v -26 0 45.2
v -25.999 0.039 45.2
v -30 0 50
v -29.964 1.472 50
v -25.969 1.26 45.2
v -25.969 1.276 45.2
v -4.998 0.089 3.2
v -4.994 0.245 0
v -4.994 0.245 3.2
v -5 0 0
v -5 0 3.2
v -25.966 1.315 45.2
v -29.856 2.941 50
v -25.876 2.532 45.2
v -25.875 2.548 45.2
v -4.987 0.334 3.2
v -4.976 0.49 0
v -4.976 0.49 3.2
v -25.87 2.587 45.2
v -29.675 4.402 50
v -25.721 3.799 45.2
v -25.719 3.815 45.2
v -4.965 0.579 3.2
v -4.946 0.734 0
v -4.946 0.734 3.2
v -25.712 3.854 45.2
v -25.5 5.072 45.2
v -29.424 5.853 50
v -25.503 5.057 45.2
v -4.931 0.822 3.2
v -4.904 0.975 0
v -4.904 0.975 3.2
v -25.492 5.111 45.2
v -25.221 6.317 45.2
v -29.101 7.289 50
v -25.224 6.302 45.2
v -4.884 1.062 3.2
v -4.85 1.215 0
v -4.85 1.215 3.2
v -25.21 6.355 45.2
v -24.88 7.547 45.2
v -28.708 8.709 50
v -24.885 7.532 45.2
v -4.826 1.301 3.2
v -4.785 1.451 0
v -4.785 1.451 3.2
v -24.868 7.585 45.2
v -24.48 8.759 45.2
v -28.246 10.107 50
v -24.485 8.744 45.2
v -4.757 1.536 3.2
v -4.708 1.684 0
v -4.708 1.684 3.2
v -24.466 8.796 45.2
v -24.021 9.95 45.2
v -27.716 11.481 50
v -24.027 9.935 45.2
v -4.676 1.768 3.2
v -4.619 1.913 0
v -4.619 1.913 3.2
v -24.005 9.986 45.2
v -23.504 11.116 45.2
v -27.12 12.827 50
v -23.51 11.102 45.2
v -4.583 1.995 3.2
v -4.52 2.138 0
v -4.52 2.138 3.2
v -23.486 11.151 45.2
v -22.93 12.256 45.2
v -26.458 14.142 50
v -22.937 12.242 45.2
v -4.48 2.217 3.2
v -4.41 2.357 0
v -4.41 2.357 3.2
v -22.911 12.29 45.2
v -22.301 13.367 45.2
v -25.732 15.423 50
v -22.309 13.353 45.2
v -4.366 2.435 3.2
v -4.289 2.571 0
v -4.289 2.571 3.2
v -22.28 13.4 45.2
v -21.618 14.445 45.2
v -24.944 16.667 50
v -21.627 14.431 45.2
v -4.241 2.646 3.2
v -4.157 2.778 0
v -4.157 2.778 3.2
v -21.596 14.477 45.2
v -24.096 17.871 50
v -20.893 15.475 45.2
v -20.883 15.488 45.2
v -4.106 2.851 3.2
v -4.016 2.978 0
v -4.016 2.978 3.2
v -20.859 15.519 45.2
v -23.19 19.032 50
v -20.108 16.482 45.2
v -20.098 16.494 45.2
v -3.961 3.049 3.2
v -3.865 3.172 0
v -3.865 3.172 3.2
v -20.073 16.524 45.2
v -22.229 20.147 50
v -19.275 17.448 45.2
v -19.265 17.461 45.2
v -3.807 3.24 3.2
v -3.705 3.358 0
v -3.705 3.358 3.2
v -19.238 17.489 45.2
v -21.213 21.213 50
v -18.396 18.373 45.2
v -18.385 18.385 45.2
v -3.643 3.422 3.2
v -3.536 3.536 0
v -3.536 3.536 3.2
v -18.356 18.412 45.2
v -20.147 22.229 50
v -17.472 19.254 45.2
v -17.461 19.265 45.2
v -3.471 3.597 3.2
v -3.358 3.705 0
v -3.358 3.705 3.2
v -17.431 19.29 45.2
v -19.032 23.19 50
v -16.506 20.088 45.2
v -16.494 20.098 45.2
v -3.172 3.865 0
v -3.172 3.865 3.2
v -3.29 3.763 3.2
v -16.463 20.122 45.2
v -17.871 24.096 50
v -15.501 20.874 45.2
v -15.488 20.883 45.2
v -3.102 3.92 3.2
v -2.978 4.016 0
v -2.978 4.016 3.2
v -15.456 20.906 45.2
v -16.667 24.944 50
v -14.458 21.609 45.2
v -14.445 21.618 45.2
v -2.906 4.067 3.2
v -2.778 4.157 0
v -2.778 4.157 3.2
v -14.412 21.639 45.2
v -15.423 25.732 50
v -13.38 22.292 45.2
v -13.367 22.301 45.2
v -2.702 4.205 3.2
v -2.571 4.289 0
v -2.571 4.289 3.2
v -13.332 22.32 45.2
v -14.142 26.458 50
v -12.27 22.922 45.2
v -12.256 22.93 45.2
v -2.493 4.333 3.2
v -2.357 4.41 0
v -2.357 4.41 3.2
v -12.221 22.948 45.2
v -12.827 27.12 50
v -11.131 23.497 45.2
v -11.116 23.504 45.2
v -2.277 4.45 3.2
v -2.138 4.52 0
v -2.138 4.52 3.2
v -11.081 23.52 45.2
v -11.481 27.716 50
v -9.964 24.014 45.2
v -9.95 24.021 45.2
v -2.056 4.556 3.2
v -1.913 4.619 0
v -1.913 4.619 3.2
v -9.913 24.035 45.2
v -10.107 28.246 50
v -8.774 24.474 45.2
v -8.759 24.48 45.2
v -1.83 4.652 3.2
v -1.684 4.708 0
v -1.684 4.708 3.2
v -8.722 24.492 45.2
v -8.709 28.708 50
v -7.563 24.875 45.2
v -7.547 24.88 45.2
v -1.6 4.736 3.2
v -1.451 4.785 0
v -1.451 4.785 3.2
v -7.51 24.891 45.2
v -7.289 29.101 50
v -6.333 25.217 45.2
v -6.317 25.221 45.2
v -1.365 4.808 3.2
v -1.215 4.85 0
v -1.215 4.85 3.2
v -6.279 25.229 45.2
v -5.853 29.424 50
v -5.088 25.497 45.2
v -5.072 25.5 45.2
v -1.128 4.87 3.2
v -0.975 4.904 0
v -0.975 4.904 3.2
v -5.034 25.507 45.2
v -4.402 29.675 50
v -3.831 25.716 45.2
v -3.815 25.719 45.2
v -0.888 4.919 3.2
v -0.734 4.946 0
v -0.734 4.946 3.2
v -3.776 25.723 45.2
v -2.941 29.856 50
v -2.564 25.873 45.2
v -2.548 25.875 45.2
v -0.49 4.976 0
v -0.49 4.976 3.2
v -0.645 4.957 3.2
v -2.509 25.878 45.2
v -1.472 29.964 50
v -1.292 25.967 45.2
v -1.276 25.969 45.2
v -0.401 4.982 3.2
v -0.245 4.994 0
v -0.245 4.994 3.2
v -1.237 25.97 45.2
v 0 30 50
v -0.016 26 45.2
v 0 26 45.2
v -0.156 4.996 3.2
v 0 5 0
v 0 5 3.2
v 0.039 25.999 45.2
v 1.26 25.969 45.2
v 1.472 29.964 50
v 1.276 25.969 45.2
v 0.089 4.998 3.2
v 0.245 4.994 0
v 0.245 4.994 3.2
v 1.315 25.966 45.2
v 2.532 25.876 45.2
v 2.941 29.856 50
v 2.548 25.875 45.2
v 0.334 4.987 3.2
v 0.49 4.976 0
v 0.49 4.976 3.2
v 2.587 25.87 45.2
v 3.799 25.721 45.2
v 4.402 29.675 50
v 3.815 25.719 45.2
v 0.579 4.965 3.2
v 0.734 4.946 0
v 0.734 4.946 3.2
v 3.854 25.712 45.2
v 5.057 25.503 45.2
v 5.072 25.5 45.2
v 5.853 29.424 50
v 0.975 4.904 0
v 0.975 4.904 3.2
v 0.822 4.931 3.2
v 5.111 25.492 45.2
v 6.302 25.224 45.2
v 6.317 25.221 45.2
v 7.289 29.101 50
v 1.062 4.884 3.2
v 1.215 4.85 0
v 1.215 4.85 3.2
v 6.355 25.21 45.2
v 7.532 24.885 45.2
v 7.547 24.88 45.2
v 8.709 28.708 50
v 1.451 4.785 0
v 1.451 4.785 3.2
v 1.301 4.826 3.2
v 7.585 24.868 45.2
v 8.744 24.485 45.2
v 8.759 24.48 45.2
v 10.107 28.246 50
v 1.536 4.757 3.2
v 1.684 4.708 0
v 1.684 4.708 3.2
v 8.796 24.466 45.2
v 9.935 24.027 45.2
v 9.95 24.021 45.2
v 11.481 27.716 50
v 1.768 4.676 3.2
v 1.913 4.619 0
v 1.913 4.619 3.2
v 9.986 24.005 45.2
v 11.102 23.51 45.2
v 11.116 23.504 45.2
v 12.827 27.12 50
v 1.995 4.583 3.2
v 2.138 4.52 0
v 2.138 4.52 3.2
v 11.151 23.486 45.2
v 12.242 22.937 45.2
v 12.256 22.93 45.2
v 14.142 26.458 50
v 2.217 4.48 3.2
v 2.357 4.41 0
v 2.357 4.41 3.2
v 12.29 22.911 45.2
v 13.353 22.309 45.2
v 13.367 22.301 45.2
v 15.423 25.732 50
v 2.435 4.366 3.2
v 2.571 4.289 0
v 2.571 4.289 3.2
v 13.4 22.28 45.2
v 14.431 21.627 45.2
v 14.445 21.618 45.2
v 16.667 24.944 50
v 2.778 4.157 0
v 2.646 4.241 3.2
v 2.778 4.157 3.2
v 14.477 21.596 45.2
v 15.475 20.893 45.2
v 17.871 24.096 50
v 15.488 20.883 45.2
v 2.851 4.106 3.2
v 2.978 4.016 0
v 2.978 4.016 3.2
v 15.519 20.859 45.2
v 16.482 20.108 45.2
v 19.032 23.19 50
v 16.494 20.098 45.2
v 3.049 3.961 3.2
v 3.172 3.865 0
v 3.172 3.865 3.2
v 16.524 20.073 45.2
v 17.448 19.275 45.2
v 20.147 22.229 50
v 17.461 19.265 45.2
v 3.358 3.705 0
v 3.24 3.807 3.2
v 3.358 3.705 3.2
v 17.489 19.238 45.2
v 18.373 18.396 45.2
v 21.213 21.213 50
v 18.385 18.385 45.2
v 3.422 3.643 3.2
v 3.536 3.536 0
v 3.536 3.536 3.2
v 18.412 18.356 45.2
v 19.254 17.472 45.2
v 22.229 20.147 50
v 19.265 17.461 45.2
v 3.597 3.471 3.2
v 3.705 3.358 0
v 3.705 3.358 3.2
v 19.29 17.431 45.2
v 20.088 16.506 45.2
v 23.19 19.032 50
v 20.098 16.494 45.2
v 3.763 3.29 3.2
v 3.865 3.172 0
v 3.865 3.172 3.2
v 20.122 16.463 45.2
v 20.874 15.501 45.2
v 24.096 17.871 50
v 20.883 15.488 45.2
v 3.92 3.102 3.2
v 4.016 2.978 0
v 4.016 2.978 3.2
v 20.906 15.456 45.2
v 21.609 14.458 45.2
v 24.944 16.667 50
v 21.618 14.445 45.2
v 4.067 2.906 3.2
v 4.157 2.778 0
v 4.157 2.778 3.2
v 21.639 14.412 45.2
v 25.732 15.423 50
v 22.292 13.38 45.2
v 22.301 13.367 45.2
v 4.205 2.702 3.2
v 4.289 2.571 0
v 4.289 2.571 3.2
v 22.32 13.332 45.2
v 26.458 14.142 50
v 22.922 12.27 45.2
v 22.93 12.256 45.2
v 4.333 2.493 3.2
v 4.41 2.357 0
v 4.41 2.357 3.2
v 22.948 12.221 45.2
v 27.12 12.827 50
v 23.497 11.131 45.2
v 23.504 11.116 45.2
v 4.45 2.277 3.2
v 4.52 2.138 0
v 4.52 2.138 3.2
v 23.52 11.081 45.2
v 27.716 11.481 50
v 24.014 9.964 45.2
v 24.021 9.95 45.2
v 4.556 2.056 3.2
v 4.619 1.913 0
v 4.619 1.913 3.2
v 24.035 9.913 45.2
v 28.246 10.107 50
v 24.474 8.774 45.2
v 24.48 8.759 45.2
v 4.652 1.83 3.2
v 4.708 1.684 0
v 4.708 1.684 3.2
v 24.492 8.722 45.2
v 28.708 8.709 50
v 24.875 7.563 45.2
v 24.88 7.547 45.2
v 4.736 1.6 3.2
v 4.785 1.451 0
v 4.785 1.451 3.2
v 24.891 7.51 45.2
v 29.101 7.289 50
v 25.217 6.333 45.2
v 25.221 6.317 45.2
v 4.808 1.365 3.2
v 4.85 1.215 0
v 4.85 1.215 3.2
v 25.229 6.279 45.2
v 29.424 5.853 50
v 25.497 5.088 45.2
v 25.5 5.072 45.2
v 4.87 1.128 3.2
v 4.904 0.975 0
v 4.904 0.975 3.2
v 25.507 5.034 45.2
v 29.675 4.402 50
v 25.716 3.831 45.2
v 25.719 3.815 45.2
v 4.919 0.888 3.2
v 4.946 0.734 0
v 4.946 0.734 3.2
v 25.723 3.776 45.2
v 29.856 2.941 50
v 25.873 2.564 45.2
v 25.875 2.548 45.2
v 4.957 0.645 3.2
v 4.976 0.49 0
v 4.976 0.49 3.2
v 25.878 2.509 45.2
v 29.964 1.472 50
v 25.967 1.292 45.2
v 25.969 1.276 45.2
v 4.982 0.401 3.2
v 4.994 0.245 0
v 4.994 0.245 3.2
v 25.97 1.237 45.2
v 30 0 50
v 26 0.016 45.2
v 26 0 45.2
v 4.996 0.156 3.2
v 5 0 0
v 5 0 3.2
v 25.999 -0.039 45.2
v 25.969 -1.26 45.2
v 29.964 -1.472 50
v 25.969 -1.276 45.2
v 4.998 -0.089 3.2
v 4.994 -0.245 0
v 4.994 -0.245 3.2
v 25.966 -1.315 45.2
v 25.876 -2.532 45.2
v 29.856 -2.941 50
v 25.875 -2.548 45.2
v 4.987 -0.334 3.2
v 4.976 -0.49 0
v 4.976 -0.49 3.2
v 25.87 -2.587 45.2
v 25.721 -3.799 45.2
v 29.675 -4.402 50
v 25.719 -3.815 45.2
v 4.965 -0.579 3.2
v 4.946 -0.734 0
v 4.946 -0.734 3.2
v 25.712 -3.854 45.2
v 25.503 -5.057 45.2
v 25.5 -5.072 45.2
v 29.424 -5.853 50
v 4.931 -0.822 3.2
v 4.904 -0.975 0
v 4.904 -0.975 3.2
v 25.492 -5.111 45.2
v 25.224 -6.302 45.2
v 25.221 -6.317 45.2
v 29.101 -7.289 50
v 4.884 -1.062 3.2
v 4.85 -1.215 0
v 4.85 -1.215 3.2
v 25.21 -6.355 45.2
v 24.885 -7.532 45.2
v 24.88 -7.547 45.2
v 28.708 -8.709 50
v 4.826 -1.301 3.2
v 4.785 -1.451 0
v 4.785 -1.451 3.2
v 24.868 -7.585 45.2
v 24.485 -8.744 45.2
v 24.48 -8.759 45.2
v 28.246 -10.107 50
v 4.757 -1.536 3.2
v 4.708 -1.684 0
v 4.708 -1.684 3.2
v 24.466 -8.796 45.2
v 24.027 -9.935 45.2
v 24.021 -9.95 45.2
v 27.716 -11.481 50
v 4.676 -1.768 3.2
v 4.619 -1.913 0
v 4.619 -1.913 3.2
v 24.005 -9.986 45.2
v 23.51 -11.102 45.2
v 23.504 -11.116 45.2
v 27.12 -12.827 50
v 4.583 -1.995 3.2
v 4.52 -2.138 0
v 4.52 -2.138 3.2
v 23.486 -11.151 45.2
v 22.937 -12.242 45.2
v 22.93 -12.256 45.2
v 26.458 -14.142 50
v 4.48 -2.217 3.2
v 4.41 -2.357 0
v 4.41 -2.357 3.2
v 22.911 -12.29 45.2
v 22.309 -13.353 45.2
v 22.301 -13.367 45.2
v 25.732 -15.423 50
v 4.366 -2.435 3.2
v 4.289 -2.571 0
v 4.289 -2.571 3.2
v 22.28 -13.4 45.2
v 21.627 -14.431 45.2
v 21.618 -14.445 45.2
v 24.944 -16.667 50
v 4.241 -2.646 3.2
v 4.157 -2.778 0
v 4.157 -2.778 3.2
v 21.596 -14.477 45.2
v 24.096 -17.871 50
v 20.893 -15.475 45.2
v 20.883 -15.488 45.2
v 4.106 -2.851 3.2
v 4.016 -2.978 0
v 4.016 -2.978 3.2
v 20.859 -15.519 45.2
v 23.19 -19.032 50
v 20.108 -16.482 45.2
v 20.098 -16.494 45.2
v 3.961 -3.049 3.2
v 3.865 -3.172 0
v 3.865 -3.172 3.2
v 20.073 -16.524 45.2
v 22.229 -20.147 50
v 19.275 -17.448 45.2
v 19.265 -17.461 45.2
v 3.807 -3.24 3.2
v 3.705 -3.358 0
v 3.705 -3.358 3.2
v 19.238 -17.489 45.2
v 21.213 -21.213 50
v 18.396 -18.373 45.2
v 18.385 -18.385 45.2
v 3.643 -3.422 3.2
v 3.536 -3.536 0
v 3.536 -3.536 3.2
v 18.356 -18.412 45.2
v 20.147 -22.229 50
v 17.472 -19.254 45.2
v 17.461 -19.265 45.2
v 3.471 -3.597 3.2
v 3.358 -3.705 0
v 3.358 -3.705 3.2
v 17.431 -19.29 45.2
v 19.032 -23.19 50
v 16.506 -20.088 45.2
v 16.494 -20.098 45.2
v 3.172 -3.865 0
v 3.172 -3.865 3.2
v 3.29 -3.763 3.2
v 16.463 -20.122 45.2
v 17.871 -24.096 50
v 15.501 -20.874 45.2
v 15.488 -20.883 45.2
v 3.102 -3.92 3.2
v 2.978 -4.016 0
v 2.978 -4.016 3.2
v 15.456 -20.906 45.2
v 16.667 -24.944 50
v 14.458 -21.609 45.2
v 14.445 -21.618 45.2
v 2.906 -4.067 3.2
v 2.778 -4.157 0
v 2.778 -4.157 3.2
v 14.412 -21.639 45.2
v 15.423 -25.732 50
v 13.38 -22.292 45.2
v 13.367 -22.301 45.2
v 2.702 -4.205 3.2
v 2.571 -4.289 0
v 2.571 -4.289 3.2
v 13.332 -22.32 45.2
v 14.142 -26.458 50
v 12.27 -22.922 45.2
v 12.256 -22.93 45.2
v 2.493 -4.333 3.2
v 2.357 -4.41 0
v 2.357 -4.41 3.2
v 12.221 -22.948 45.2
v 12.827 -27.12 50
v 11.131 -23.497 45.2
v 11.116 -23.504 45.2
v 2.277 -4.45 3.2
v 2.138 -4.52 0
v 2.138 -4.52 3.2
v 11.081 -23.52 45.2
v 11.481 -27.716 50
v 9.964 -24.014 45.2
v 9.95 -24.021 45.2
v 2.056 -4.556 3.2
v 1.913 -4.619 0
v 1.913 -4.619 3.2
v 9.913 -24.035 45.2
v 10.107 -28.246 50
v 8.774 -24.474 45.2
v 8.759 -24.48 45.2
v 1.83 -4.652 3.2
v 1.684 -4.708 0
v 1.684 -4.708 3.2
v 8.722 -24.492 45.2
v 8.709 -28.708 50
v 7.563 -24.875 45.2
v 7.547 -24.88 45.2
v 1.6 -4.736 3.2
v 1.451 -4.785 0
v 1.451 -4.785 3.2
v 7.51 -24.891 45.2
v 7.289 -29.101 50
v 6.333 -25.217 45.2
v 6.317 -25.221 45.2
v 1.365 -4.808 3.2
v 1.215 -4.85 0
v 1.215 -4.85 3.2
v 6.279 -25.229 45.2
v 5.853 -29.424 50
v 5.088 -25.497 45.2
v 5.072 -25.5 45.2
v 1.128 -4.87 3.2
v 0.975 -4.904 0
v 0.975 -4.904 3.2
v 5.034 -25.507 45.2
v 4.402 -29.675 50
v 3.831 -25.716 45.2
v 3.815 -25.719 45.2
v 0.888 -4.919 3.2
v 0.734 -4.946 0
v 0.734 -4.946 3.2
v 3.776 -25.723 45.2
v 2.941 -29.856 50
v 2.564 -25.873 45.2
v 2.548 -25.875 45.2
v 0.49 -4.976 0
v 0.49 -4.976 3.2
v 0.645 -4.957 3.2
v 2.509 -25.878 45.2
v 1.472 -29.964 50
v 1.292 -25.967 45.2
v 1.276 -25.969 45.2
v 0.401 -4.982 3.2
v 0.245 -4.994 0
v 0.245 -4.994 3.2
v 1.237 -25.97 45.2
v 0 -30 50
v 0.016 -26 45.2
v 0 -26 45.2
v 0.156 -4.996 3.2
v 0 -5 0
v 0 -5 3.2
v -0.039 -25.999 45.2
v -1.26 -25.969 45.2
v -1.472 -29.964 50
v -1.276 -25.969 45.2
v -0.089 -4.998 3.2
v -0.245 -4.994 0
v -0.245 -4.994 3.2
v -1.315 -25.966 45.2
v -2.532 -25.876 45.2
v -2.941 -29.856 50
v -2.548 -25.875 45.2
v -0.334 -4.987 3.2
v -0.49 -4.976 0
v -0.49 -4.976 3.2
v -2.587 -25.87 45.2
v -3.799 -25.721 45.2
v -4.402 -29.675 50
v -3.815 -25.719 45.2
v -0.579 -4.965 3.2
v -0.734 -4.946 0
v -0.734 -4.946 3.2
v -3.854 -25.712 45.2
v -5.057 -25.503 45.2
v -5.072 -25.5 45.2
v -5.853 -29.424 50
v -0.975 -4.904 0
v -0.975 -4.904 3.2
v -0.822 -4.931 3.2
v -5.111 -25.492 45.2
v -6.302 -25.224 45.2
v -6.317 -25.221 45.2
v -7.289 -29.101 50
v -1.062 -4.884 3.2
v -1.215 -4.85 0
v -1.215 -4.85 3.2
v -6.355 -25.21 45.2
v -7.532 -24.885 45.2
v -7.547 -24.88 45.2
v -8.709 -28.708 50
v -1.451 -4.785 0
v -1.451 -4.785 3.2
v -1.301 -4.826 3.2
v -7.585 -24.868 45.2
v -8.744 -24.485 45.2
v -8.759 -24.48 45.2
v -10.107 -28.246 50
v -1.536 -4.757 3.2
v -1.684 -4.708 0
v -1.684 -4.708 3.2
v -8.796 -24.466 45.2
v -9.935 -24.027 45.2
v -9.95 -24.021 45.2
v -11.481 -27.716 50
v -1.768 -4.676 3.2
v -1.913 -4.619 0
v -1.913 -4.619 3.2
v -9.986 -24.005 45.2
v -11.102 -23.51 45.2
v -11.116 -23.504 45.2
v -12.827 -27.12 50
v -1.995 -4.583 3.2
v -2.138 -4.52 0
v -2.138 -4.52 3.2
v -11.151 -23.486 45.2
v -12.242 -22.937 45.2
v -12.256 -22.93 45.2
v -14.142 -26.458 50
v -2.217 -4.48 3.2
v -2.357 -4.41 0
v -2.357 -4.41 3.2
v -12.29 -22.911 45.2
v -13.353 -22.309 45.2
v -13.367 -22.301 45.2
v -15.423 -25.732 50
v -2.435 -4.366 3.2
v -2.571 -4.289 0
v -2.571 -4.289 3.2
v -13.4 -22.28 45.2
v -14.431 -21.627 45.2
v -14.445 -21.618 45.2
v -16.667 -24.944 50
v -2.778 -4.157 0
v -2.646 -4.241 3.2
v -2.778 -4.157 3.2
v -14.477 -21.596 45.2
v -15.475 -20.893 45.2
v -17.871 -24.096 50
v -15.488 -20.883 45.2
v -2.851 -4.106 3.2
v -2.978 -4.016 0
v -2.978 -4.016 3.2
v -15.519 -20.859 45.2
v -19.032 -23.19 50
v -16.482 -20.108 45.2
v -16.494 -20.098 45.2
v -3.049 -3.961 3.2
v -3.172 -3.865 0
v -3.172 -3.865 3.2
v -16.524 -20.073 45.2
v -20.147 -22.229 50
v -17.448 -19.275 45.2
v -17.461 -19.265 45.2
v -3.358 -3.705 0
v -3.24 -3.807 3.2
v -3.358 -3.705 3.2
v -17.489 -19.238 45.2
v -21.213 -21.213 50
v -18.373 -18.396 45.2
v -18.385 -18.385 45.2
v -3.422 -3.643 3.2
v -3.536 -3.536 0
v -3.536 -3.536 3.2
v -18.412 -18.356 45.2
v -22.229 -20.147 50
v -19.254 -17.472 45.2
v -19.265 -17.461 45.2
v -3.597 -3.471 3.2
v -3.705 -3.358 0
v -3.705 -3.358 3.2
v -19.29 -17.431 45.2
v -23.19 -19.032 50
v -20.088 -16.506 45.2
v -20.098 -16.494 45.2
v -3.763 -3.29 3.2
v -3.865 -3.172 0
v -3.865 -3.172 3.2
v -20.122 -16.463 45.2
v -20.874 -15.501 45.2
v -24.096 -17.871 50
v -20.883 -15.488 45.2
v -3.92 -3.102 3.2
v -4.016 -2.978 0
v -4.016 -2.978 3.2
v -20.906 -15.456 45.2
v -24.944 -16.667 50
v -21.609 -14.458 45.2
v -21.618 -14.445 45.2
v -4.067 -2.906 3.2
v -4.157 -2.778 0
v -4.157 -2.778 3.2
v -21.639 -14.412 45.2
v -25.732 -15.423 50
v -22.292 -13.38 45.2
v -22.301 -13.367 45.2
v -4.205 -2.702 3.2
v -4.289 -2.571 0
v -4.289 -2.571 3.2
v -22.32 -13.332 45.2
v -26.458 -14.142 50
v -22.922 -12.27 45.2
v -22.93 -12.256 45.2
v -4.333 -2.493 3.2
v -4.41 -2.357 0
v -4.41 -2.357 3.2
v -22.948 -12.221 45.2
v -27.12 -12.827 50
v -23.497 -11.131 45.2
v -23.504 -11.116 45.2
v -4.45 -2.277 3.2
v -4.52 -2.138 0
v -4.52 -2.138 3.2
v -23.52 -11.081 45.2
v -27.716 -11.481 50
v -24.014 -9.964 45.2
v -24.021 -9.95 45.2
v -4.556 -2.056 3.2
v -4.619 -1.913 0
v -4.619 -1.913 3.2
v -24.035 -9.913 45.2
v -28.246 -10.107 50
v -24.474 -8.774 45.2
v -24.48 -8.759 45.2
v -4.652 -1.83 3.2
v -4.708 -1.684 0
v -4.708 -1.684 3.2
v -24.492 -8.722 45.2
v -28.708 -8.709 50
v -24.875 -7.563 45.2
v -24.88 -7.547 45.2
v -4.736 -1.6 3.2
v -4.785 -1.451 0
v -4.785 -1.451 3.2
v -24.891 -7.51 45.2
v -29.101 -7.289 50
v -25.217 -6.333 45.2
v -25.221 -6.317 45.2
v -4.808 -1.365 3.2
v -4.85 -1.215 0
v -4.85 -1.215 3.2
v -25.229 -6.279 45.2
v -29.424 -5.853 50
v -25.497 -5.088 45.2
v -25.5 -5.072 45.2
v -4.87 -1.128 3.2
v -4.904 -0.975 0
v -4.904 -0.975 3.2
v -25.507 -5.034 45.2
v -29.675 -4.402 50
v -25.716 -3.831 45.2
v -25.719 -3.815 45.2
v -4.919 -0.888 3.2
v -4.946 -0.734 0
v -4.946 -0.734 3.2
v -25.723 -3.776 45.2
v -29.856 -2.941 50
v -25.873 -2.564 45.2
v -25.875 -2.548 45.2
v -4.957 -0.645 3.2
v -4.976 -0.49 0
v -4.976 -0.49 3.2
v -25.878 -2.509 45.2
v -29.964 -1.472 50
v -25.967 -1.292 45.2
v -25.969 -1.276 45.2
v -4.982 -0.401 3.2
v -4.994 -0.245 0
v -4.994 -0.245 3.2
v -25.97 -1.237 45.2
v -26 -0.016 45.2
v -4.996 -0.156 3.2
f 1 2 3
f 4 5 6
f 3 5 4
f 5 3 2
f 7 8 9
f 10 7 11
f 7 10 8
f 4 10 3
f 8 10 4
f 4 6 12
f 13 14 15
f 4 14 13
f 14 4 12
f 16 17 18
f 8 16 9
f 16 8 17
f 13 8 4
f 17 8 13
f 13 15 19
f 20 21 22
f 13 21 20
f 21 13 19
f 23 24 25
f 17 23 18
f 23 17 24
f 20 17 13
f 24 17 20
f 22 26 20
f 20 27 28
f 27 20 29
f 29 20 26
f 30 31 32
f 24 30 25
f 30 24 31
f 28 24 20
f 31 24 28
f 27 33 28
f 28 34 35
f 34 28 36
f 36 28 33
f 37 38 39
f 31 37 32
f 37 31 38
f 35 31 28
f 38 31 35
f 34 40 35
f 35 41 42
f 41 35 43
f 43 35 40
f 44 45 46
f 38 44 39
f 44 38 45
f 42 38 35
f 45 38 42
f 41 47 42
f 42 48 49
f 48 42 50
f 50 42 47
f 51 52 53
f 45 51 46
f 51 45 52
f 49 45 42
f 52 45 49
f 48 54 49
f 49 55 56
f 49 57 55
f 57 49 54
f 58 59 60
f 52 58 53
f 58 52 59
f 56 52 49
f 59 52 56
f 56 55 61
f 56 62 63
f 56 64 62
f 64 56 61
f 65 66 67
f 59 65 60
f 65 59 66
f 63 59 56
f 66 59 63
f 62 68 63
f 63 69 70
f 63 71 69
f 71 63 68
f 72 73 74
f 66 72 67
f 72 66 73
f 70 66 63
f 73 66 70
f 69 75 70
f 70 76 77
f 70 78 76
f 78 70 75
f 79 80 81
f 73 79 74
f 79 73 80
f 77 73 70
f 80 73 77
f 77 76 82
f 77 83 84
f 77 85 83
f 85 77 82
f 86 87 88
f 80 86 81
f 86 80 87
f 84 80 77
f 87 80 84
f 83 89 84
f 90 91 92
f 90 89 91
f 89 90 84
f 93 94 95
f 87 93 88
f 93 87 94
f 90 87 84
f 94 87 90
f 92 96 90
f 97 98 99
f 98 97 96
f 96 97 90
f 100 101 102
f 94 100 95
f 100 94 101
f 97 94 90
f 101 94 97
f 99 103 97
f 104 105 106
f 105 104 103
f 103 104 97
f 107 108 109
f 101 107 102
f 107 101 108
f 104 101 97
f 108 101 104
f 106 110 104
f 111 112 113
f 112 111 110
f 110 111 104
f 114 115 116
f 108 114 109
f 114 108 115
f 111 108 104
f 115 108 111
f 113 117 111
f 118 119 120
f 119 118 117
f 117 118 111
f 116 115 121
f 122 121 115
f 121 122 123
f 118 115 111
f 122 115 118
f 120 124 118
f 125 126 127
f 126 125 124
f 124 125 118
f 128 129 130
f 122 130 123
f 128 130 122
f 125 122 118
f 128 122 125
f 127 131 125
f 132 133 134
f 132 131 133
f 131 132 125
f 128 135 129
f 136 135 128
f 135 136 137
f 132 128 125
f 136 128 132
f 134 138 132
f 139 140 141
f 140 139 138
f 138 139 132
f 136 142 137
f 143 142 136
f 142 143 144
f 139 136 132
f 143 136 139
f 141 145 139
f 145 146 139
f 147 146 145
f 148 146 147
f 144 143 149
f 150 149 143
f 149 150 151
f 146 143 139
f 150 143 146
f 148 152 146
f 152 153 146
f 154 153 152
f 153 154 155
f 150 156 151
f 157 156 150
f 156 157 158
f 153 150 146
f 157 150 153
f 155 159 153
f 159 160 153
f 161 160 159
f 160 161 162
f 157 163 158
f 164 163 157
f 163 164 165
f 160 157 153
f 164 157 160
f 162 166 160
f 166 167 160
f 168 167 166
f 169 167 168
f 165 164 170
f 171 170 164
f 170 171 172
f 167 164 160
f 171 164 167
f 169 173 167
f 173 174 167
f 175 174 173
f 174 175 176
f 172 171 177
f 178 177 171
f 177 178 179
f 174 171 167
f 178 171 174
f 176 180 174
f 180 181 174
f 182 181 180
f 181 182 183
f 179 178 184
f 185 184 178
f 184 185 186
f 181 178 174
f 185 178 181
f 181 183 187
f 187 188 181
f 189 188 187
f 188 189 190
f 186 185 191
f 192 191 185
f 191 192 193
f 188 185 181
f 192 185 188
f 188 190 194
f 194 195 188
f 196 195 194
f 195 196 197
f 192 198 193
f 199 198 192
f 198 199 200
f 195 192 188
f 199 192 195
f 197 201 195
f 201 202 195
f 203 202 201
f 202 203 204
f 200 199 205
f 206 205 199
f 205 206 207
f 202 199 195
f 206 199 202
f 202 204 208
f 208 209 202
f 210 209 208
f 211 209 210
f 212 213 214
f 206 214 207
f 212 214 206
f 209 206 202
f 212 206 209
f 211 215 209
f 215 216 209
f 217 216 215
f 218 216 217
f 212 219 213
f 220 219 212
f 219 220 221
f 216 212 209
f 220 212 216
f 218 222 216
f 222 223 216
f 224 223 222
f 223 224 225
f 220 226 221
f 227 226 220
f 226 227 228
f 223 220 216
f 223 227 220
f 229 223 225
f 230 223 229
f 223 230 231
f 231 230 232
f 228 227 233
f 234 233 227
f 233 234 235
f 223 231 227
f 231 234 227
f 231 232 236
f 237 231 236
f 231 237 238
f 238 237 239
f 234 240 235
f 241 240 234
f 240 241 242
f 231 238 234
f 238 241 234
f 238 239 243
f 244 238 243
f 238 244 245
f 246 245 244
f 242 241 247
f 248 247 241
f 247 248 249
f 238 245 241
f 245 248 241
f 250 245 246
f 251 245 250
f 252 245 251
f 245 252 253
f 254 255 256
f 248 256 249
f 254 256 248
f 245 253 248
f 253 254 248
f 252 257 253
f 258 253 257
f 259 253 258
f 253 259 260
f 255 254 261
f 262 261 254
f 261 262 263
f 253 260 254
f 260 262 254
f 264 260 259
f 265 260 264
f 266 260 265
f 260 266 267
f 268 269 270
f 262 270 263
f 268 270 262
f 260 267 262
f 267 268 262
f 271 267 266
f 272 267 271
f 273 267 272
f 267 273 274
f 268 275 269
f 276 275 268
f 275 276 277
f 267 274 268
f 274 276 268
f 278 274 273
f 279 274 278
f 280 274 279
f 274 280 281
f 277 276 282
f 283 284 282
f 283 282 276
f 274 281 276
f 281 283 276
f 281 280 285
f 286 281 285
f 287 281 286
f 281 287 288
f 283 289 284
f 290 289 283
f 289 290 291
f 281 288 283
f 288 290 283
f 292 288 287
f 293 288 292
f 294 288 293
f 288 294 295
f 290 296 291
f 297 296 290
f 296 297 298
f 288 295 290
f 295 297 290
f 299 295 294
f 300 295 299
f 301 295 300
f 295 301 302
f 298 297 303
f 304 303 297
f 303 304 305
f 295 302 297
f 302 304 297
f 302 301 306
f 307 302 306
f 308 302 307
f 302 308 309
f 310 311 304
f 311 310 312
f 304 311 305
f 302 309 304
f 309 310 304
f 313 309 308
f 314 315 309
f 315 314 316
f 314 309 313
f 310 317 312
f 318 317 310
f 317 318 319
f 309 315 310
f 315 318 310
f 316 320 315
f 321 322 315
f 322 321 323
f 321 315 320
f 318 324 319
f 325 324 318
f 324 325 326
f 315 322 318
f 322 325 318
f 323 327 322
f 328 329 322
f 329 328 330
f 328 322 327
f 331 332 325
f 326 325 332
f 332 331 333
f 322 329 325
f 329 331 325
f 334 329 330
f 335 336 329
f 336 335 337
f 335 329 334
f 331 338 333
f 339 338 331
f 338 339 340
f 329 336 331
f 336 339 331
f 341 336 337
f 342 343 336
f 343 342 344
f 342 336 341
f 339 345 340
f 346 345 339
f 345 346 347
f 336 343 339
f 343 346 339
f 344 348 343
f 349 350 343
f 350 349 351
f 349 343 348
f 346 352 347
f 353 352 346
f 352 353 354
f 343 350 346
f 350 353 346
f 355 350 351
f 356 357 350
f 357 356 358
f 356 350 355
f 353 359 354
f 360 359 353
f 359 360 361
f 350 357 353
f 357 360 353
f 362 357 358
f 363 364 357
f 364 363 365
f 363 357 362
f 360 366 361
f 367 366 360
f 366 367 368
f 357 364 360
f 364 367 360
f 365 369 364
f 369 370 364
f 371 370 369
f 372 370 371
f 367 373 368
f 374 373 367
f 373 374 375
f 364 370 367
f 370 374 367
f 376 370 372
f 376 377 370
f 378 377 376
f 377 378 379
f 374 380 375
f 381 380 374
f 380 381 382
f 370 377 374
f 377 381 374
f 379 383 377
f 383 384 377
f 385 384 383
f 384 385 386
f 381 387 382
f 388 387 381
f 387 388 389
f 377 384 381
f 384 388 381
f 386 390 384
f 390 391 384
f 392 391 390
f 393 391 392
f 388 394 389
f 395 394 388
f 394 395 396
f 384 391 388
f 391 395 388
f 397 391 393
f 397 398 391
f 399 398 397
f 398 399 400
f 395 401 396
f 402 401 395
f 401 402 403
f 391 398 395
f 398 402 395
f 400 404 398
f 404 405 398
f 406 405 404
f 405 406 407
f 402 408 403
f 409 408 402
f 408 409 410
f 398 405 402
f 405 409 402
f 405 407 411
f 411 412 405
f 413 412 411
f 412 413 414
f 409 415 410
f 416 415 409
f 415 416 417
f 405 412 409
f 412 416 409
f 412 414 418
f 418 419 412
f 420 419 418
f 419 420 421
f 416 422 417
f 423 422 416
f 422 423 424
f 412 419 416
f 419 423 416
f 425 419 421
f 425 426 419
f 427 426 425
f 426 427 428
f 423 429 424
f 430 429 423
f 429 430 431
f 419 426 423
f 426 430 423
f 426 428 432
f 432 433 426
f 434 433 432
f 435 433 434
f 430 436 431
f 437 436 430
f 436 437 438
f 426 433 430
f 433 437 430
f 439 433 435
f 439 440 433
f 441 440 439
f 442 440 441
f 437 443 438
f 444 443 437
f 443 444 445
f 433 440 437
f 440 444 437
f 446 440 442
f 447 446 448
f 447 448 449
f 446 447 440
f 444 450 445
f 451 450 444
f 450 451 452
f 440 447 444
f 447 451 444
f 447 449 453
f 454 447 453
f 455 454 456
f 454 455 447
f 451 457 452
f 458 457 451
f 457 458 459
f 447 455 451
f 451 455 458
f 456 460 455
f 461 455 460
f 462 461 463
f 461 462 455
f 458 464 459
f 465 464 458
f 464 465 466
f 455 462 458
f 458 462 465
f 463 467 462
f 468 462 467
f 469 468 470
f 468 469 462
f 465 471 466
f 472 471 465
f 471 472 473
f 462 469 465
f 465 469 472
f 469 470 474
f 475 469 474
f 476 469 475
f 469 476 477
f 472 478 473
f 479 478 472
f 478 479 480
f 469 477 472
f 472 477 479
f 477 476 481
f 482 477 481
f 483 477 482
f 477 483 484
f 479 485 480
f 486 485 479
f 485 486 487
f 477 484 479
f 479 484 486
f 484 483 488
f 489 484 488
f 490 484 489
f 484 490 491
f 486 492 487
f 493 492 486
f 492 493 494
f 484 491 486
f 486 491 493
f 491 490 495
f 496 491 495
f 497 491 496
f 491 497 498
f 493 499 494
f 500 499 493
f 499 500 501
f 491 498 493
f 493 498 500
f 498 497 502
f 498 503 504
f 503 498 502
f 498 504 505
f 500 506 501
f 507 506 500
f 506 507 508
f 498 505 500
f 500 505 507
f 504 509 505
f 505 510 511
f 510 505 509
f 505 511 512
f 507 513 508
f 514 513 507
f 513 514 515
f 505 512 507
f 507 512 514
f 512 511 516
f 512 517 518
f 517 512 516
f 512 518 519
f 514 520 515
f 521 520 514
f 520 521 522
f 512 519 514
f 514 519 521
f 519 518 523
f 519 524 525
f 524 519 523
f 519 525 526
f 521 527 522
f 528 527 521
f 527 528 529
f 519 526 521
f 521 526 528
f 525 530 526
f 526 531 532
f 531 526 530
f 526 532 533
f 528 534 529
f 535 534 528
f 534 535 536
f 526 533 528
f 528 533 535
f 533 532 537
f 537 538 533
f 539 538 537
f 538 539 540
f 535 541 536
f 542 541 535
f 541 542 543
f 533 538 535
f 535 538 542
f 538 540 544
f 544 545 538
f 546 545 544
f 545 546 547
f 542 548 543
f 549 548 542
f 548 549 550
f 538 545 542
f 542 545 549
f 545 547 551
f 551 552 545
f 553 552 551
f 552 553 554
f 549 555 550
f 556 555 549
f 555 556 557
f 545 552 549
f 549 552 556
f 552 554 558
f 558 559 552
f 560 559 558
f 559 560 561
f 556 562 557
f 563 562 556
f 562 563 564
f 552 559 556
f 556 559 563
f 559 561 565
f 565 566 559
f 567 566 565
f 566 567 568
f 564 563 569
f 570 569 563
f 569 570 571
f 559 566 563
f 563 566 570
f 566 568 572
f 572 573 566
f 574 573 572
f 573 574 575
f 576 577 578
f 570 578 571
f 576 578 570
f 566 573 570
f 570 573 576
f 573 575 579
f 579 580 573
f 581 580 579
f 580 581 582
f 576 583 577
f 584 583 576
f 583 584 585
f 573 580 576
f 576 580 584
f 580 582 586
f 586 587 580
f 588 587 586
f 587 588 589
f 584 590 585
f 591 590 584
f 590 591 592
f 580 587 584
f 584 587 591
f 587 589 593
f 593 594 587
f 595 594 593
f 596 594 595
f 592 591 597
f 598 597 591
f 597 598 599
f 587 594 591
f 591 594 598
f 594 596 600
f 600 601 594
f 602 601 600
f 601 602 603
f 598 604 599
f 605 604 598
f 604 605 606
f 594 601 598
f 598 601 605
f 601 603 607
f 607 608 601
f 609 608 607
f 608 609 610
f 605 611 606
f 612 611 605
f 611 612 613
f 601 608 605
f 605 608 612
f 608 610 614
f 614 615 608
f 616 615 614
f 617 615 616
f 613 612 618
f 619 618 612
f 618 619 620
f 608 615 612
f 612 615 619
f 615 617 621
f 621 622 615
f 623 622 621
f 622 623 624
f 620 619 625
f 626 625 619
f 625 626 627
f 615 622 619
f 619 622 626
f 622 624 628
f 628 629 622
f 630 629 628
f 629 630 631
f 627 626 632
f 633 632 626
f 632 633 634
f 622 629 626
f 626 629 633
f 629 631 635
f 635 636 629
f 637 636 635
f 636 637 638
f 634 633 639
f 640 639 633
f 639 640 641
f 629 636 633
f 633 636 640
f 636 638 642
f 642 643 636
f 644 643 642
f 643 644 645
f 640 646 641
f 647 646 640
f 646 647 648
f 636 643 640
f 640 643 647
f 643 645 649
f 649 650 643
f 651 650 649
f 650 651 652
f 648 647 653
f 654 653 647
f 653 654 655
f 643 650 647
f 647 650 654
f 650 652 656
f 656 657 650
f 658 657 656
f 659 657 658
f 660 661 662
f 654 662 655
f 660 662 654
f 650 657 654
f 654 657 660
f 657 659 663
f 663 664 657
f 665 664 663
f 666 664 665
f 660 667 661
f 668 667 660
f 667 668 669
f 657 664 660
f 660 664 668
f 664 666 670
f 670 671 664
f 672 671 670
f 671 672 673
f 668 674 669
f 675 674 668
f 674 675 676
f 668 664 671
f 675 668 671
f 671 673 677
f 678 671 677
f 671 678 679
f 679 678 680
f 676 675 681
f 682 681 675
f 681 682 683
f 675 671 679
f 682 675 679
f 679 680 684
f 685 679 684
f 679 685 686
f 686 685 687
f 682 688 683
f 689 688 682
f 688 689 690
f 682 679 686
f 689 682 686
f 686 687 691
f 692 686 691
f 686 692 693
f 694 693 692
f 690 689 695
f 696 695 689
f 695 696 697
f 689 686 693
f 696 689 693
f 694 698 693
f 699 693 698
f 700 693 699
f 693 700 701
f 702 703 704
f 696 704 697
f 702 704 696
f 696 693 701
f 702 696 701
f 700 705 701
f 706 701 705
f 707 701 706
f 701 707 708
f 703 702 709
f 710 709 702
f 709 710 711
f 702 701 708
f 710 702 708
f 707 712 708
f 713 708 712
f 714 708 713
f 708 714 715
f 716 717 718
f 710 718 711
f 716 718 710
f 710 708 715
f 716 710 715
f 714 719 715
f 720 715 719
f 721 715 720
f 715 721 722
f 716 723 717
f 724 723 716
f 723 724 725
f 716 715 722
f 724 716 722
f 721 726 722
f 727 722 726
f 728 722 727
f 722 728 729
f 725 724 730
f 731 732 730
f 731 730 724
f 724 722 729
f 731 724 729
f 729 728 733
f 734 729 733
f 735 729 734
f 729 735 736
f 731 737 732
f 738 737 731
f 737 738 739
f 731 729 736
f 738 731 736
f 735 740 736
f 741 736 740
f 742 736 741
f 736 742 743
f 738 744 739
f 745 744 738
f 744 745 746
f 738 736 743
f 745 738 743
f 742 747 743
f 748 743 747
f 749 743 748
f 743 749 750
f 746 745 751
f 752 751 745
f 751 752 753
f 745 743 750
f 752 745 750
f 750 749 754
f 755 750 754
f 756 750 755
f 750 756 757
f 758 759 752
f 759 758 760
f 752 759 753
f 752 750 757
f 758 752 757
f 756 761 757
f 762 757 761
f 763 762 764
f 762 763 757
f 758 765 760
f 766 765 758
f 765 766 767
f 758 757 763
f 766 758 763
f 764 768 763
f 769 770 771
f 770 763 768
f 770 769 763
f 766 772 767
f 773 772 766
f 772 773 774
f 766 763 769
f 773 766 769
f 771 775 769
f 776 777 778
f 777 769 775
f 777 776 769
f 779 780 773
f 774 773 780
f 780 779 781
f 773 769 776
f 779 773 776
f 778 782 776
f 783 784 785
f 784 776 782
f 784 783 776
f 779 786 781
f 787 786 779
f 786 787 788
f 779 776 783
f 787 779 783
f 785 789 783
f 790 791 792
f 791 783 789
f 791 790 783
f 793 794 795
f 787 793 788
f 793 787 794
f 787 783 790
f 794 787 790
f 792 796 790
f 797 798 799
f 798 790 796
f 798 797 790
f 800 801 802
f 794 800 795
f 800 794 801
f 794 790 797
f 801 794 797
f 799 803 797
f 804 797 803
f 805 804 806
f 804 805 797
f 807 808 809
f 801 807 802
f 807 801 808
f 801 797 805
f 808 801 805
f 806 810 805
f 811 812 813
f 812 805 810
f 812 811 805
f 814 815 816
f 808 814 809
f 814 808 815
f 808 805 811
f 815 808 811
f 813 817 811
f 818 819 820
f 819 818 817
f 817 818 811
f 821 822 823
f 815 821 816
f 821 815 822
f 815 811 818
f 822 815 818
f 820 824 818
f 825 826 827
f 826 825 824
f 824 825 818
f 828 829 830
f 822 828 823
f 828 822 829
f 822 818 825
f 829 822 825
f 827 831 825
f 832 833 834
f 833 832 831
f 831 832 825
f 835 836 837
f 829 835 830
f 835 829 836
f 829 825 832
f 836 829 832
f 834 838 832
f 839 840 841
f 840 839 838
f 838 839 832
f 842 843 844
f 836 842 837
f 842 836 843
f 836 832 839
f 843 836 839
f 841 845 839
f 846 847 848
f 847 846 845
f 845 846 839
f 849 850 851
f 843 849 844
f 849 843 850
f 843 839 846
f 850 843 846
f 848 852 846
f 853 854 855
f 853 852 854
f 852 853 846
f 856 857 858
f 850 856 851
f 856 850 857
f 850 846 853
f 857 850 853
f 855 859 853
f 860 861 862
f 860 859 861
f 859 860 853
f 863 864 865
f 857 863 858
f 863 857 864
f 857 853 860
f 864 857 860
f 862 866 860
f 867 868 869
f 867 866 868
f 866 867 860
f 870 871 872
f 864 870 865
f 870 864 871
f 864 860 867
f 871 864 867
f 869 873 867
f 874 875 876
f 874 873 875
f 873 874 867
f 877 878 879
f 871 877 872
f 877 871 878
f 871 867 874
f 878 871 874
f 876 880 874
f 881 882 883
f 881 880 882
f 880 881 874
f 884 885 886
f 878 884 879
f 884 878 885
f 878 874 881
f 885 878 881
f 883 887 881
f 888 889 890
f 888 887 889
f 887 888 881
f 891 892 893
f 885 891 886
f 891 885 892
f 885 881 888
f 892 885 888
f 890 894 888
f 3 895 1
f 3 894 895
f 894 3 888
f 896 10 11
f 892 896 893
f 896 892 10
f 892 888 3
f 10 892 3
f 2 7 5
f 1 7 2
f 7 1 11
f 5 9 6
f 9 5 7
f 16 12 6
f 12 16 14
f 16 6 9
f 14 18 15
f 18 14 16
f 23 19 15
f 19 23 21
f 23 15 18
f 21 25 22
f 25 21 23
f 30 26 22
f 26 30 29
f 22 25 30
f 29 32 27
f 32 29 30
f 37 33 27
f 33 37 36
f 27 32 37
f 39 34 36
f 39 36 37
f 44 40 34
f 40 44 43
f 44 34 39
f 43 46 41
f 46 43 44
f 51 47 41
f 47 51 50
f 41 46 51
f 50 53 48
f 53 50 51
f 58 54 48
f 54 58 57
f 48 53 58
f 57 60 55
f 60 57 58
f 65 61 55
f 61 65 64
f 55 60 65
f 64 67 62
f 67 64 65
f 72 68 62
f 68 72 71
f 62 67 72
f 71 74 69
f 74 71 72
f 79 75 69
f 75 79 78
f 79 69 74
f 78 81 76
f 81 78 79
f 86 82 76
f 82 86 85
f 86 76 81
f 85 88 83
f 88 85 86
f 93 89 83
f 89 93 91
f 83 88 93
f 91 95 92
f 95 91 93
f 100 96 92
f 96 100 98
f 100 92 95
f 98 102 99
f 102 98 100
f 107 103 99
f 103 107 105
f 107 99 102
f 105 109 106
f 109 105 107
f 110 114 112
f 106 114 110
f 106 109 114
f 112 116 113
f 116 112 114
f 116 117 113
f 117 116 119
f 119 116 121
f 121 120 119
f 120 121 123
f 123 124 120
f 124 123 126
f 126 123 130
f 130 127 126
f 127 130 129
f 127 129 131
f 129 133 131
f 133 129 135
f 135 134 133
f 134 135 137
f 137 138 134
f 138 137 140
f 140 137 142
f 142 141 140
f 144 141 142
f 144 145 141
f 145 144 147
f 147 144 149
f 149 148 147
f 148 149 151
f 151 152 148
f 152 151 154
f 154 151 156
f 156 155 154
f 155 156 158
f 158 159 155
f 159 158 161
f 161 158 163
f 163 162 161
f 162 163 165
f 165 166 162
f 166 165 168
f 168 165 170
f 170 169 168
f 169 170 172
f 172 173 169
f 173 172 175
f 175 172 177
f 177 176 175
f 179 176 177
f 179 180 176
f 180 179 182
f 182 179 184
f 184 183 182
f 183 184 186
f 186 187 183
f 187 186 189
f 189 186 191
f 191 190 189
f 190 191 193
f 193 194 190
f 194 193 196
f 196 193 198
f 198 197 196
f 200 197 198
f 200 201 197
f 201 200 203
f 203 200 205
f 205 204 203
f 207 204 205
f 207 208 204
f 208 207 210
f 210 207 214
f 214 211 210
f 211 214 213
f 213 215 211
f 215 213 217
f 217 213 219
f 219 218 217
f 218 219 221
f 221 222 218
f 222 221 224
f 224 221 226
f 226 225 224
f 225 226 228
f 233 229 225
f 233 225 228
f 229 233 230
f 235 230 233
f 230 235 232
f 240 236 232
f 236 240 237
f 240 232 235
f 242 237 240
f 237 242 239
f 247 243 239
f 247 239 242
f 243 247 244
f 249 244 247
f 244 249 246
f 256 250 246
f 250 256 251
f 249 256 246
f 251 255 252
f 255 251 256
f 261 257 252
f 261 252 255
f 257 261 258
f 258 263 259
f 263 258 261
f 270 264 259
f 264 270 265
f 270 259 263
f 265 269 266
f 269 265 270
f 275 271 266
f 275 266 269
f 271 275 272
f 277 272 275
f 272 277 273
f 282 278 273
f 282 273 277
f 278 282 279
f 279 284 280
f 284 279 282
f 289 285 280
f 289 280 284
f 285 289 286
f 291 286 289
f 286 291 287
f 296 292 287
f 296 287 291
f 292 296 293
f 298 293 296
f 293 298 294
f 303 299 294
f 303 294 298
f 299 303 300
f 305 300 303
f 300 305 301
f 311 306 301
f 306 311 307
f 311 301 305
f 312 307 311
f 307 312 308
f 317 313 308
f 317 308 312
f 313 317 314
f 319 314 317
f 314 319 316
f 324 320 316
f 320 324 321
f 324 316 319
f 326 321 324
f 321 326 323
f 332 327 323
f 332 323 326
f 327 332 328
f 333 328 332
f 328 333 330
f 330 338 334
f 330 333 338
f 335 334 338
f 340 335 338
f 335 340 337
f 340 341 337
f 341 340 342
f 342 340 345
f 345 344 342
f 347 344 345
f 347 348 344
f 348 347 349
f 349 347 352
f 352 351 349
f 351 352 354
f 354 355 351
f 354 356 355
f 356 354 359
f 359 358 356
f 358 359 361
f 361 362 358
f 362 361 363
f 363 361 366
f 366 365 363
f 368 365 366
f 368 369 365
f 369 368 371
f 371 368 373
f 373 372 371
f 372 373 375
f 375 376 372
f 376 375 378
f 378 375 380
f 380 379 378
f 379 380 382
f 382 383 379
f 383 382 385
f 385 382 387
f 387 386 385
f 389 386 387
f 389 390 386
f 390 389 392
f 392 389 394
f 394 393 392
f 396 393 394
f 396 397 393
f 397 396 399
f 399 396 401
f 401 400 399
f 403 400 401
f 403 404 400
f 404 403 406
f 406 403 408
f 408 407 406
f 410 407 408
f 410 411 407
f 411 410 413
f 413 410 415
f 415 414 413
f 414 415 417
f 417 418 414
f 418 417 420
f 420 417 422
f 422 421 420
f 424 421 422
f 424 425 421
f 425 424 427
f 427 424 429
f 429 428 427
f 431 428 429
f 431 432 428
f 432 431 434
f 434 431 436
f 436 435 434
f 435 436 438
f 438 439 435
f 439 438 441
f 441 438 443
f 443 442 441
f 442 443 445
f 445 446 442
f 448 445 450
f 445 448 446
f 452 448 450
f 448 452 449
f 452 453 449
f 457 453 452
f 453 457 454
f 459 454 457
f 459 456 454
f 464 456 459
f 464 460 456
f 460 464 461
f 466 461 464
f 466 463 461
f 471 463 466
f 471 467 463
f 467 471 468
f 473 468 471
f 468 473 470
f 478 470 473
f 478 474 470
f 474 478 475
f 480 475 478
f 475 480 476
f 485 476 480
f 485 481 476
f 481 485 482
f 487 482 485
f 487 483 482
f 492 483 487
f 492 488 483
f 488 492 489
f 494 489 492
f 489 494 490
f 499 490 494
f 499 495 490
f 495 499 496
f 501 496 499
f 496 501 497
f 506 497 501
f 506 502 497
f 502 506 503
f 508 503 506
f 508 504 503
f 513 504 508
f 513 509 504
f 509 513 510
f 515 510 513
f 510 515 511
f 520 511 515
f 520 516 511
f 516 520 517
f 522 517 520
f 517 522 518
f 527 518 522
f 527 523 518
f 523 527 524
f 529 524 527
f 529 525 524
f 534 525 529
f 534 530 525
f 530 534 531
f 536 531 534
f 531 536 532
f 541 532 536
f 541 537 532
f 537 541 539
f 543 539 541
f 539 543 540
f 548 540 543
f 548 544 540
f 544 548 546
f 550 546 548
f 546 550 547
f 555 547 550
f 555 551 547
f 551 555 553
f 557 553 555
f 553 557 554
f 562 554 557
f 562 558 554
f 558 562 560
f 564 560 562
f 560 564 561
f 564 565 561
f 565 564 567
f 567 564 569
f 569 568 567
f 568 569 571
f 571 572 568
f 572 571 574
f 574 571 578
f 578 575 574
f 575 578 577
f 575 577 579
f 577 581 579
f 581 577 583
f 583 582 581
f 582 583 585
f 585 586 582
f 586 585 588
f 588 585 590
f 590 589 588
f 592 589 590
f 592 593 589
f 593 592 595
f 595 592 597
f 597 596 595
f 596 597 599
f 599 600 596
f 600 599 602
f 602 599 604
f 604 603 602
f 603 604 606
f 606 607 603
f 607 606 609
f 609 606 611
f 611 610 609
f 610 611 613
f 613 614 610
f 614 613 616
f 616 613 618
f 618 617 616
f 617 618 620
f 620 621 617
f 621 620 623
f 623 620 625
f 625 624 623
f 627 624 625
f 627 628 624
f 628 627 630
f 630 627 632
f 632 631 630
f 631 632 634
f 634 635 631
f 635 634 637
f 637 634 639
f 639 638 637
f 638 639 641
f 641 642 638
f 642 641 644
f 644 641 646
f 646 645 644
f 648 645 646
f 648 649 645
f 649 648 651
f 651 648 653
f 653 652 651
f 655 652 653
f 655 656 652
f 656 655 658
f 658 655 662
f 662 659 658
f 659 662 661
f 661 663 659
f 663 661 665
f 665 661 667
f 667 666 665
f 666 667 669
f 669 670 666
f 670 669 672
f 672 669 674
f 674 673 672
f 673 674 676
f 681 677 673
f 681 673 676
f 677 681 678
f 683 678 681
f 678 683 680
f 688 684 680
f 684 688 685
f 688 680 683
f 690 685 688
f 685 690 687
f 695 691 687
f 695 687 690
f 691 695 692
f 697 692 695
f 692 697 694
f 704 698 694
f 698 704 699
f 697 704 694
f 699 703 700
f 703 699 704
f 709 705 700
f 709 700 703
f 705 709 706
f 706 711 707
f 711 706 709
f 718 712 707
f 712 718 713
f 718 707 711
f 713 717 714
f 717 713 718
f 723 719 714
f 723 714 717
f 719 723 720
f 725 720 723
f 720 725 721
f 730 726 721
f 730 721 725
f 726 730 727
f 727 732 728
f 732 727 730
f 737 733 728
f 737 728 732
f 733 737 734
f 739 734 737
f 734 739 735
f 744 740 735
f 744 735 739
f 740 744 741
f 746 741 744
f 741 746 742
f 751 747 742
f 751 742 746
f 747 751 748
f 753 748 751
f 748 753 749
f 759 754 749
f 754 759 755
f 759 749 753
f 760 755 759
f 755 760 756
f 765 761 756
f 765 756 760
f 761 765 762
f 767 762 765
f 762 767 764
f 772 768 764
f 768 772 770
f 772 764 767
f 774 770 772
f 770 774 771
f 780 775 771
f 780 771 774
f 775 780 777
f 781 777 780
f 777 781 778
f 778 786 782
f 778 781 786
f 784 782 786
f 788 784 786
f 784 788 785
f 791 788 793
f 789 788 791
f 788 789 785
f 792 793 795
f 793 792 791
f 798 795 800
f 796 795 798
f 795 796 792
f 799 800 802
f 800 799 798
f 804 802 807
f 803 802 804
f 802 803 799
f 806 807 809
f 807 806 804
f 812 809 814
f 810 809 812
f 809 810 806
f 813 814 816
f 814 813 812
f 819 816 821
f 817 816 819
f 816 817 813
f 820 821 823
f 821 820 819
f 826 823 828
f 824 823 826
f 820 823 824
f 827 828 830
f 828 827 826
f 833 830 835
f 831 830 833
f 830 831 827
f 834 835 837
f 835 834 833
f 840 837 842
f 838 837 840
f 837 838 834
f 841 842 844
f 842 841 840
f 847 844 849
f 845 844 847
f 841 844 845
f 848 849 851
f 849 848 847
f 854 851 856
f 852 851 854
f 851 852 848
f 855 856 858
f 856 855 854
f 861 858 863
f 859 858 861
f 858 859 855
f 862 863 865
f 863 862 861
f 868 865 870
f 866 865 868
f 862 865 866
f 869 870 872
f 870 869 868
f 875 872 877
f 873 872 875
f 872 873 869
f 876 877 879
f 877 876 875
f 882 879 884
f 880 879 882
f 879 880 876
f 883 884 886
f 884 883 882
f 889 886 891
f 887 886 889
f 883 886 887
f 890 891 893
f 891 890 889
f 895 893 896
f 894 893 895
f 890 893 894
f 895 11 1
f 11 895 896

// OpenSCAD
// Lab funnel - straight spout with conical body, open top and bottom.
// Printed upright, wide opening at top (z=50), spout at bottom (z=0).

// Dimensions
spout_od      = 10;      // Outer diameter of straight spout
spout_id      = 6.8;     // Inner diameter of straight spout (10 - 2*1.6)
spout_len     = 20;      // Length of straight spout
funnel_start  = 20;      // Z position where cone begins
funnel_end    = 50;      // Z position of funnel rim
funnel_od     = 60;      // Outer diameter at rim
funnel_id     = 56.8;    // Inner diameter at rim (60 - 2*1.6)
wall_thick    = 1.6;     // Wall thickness everywhere

$fn = 128;

// Outer Profile Points [radius, z]
// 1. Bottom of spout (z=0, r=5)
// 2. Top of spout / Bottom of cone (z=20, r=5)
// 3. Top of funnel (z=50, r=30)
outer_points = [
    [spout_od / 2, 0],
    [spout_od / 2, funnel_start],
    [funnel_od / 2, funnel_end]
];

// Inner Profile Points [radius, z]
// 1. Bottom of spout (z=0, r=3.4) - Straight tube
// 2. Top of spout / Bottom of cone (z=20, r=3.4) - Straight tube ends
// 3. Top of funnel (z=50, r=28.4) - Cone widens here
inner_points = [
    [spout_id / 2, 0],
    [spout_id / 2, funnel_start],
    [funnel_id / 2, funnel_end]
];

difference() {
    // Create the outer solid
    rotate_extrude() 
        polygon(outer_points);
    
    // Create the inner void (hole)
    rotate_extrude() 
        polygon(inner_points);
}
